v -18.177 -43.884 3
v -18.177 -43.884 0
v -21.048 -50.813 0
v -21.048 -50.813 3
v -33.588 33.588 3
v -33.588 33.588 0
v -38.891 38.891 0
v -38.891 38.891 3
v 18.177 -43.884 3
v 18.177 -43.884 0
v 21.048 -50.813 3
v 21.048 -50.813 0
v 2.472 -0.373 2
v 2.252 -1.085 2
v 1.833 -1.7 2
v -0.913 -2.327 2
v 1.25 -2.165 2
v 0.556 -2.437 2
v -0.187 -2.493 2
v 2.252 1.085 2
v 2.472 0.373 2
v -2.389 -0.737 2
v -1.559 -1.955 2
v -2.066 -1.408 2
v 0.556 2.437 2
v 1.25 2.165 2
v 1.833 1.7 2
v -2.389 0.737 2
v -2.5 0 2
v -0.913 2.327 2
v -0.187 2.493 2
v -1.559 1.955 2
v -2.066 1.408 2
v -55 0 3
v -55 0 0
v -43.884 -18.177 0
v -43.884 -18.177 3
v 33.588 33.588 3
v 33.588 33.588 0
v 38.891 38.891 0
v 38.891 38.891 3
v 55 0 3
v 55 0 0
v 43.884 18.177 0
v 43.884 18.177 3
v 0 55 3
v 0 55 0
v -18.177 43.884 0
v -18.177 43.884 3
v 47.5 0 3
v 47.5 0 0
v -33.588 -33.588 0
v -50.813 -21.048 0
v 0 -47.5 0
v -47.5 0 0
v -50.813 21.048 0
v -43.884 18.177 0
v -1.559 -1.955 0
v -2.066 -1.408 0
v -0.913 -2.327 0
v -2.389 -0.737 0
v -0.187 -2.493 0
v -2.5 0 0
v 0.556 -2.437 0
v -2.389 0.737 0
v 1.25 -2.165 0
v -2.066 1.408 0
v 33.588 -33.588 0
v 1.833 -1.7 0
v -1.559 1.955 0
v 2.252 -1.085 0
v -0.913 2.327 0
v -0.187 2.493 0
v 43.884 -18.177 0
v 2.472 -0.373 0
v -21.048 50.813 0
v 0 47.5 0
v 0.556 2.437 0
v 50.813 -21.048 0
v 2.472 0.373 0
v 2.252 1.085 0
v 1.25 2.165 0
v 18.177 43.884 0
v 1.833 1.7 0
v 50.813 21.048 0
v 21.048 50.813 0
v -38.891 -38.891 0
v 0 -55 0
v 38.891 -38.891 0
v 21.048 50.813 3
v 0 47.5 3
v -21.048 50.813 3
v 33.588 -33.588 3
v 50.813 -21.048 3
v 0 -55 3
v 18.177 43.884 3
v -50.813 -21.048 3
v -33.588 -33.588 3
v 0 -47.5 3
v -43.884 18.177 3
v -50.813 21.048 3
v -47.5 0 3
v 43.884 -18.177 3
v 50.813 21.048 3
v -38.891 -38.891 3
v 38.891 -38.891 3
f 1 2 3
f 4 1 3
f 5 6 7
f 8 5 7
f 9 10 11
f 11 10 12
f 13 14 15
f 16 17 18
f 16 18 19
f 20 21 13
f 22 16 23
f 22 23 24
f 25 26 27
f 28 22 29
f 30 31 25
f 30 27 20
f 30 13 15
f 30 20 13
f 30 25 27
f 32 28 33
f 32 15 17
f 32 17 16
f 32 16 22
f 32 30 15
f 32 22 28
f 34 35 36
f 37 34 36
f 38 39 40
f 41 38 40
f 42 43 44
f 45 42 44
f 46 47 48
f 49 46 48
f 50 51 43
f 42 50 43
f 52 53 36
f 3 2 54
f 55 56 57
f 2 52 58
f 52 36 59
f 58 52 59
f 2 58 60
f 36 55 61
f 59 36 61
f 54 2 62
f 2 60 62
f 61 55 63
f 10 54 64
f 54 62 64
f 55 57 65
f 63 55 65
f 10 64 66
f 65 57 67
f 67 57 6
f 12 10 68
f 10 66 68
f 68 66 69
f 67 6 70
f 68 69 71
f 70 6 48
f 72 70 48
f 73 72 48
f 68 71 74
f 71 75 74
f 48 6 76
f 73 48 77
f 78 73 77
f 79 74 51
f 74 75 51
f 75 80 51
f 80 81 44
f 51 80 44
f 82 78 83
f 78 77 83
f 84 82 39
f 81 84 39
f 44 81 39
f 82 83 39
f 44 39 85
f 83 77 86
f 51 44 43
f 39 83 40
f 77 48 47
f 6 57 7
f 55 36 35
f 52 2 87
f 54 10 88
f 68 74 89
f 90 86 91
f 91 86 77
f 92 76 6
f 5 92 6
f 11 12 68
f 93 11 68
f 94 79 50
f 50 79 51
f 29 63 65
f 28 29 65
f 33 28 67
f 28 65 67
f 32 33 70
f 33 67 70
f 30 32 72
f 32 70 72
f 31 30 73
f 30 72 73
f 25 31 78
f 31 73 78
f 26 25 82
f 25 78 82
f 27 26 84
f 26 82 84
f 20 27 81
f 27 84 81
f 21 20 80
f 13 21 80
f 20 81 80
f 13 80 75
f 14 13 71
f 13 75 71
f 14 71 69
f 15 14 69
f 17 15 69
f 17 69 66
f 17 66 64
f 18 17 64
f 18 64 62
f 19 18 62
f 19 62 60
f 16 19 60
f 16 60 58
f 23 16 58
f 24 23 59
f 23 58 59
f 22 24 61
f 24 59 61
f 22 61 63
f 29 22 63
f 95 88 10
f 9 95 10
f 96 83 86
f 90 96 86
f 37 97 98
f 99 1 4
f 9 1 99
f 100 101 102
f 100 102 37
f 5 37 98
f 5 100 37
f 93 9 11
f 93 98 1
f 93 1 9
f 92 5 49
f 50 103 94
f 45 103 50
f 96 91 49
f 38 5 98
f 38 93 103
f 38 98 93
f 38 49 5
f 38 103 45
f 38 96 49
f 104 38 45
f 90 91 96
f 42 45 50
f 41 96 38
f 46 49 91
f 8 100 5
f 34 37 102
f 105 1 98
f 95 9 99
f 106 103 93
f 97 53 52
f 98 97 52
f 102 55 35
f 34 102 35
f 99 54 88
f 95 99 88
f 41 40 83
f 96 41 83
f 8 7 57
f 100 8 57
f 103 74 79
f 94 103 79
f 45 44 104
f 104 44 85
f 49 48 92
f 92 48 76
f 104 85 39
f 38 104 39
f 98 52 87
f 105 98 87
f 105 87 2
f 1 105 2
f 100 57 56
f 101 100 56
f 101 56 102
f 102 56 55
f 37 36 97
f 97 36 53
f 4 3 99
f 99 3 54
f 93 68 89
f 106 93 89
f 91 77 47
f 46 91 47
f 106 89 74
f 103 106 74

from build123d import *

# Parameters (mm, degrees)
SKETCH1_R           = 55
BOSS_EXTRUDE1_DEPTH = 3
CUT_EXTRUDE1_DEPTH  = 3
SKETCH3_R           = 2.5
CUT_EXTRUDE2_DEPTH  = 2


with BuildPart() as part:
    # Sketch1 → Boss-Extrude1 (new body)
    with BuildSketch(Plane.XY):
        Circle(SKETCH1_R)
    extrude(amount=BOSS_EXTRUDE1_DEPTH)

    # Sketch2 → Cut-Extrude1 (cut)
    with BuildSketch(Plane(origin=(0, 0, 0), x_dir=(-1, 0, 0), z_dir=(0, 0, -1))):
        with BuildLine():
            Line((43.884277794, 18.177463037), (50.813374288, 21.04758878))
            ThreePointArc((50.813374288, 21.04758878), (45.730828677, 30.556362816), (38.890872965, 38.890872965))
            Line((38.890872965, 38.890872965), (43.884277794, 18.177463037))
        make_face()
        with BuildLine():
            Line((33.587572106, 33.587572106), (38.890872965, 38.890872965))
            ThreePointArc((38.890872965, 38.890872965), (30.556362816, 45.730828677), (21.04758878, 50.813374288))
            Line((21.04758878, 50.813374288), (33.587572106, 33.587572106))
        make_face()
        with BuildLine():
            Line((18.177463037, 43.884277794), (21.04758878, 50.813374288))
            ThreePointArc((21.04758878, 50.813374288), (10.729967711, 53.943190422), (0, 55))
            Line((0, 55), (18.177463037, 43.884277794))
        make_face()
        with BuildLine():
            Line((0, 47.5), (0, 55))
            ThreePointArc((0, 55), (-10.729967711, 53.943190422), (-21.04758878, 50.813374288))
            Line((-21.04758878, 50.813374288), (0, 47.5))
        make_face()
        with BuildLine():
            Line((-18.177463037, 43.884277794), (-21.04758878, 50.813374288))
            ThreePointArc((-21.04758878, 50.813374288), (-30.556362816, 45.730828677), (-38.890872965, 38.890872965))
            Line((-38.890872965, 38.890872965), (-18.177463037, 43.884277794))
        make_face()
        with BuildLine():
            Line((-33.587572106, 33.587572106), (-38.890872965, 38.890872965))
            ThreePointArc((-38.890872965, 38.890872965), (-45.730828677, 30.556362816), (-50.813374288, 21.04758878))
            Line((-50.813374288, 21.04758878), (-33.587572106, 33.587572106))
        make_face()
        with BuildLine():
            Line((-43.884277794, 18.177463037), (-50.813374288, 21.04758878))
            ThreePointArc((-50.813374288, 21.04758878), (-53.943190422, 10.729967711), (-55, 0))
            Line((-55, 0), (-43.884277794, 18.177463037))
        make_face()
        with BuildLine():
            ThreePointArc((-55, 0), (-53.943190422, -10.729967711), (-50.813374288, -21.04758878))
            Line((-50.813374288, -21.04758878), (-47.5, 0))
            Line((-47.5, 0), (-55, 0))
        make_face()
        with BuildLine():
            ThreePointArc((-50.813374288, -21.04758878), (-45.730828677, -30.556362816), (-38.890872965, -38.890872965))
            Line((-38.890872965, -38.890872965), (-43.884277794, -18.177463037))
            Line((-43.884277794, -18.177463037), (-50.813374288, -21.04758878))
        make_face()
        with BuildLine():
            ThreePointArc((-38.890872965, -38.890872965), (-30.556362816, -45.730828677), (-21.04758878, -50.813374288))
            Line((-21.04758878, -50.813374288), (-33.587572106, -33.587572106))
            Line((-33.587572106, -33.587572106), (-38.890872965, -38.890872965))
        make_face()
        with BuildLine():
            ThreePointArc((-21.04758878, -50.813374288), (-10.729967711, -53.943190422), (0, -55))
            Line((0, -55), (-18.177463037, -43.884277794))
            Line((-18.177463037, -43.884277794), (-21.04758878, -50.813374288))
        make_face()
        with BuildLine():
            ThreePointArc((0, -55), (10.729967711, -53.943190422), (21.04758878, -50.813374288))
            Line((21.04758878, -50.813374288), (0, -47.5))
            Line((0, -47.5), (0, -55))
        make_face()
        with BuildLine():
            ThreePointArc((21.04758878, -50.813374288), (30.556362816, -45.730828677), (38.890872965, -38.890872965))
            Line((38.890872965, -38.890872965), (18.177463037, -43.884277794))
            Line((18.177463037, -43.884277794), (21.04758878, -50.813374288))
        make_face()
        with BuildLine():
            ThreePointArc((38.890872965, -38.890872965), (45.730828677, -30.556362816), (50.813374288, -21.04758878))
            Line((50.813374288, -21.04758878), (33.587572106, -33.587572106))
            Line((33.587572106, -33.587572106), (38.890872965, -38.890872965))
        make_face()
        with BuildLine():
            ThreePointArc((50.813374288, -21.04758878), (53.943190422, -10.729967711), (55, 0))
            Line((55, 0), (43.884277794, -18.177463037))
            Line((43.884277794, -18.177463037), (50.813374288, -21.04758878))
        make_face()
        with BuildLine():
            Line((50.813374288, 21.04758878), (47.5, 0))
            Line((47.5, 0), (55, 0))
            ThreePointArc((55, 0), (53.943190422, 10.729967711), (50.813374288, 21.04758878))
        make_face()
    extrude(amount=-CUT_EXTRUDE1_DEPTH, mode=Mode.SUBTRACT)

    # Sketch3 → Cut-Extrude2 (cut)
    with BuildSketch(Plane(origin=(0, 0, 0), x_dir=(-1, 0, 0), z_dir=(0, 0, -1))):
        Circle(SKETCH3_R)
    extrude(amount=-CUT_EXTRUDE2_DEPTH, mode=Mode.SUBTRACT)


solid = part.part
